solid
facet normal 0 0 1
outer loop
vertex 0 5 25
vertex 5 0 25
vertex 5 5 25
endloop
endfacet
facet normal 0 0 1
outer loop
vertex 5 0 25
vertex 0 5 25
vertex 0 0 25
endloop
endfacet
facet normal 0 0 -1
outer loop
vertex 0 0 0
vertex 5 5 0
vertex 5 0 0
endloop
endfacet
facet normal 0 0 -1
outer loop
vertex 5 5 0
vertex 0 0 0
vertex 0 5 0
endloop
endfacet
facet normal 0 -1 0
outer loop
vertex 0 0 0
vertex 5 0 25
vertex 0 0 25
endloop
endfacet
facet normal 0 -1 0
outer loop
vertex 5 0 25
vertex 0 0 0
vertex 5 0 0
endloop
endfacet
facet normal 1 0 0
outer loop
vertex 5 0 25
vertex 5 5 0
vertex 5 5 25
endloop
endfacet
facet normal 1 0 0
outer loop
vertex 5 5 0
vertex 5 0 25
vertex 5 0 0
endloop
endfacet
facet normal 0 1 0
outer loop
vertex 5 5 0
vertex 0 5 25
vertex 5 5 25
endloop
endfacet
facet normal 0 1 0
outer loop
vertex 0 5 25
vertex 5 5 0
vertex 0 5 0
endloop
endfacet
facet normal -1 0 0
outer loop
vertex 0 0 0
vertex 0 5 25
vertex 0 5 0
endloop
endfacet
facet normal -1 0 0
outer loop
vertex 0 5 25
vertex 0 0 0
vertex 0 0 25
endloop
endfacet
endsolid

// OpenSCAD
// Generated by generate_scads.py
cube(size=[5,5,25], center=false);
